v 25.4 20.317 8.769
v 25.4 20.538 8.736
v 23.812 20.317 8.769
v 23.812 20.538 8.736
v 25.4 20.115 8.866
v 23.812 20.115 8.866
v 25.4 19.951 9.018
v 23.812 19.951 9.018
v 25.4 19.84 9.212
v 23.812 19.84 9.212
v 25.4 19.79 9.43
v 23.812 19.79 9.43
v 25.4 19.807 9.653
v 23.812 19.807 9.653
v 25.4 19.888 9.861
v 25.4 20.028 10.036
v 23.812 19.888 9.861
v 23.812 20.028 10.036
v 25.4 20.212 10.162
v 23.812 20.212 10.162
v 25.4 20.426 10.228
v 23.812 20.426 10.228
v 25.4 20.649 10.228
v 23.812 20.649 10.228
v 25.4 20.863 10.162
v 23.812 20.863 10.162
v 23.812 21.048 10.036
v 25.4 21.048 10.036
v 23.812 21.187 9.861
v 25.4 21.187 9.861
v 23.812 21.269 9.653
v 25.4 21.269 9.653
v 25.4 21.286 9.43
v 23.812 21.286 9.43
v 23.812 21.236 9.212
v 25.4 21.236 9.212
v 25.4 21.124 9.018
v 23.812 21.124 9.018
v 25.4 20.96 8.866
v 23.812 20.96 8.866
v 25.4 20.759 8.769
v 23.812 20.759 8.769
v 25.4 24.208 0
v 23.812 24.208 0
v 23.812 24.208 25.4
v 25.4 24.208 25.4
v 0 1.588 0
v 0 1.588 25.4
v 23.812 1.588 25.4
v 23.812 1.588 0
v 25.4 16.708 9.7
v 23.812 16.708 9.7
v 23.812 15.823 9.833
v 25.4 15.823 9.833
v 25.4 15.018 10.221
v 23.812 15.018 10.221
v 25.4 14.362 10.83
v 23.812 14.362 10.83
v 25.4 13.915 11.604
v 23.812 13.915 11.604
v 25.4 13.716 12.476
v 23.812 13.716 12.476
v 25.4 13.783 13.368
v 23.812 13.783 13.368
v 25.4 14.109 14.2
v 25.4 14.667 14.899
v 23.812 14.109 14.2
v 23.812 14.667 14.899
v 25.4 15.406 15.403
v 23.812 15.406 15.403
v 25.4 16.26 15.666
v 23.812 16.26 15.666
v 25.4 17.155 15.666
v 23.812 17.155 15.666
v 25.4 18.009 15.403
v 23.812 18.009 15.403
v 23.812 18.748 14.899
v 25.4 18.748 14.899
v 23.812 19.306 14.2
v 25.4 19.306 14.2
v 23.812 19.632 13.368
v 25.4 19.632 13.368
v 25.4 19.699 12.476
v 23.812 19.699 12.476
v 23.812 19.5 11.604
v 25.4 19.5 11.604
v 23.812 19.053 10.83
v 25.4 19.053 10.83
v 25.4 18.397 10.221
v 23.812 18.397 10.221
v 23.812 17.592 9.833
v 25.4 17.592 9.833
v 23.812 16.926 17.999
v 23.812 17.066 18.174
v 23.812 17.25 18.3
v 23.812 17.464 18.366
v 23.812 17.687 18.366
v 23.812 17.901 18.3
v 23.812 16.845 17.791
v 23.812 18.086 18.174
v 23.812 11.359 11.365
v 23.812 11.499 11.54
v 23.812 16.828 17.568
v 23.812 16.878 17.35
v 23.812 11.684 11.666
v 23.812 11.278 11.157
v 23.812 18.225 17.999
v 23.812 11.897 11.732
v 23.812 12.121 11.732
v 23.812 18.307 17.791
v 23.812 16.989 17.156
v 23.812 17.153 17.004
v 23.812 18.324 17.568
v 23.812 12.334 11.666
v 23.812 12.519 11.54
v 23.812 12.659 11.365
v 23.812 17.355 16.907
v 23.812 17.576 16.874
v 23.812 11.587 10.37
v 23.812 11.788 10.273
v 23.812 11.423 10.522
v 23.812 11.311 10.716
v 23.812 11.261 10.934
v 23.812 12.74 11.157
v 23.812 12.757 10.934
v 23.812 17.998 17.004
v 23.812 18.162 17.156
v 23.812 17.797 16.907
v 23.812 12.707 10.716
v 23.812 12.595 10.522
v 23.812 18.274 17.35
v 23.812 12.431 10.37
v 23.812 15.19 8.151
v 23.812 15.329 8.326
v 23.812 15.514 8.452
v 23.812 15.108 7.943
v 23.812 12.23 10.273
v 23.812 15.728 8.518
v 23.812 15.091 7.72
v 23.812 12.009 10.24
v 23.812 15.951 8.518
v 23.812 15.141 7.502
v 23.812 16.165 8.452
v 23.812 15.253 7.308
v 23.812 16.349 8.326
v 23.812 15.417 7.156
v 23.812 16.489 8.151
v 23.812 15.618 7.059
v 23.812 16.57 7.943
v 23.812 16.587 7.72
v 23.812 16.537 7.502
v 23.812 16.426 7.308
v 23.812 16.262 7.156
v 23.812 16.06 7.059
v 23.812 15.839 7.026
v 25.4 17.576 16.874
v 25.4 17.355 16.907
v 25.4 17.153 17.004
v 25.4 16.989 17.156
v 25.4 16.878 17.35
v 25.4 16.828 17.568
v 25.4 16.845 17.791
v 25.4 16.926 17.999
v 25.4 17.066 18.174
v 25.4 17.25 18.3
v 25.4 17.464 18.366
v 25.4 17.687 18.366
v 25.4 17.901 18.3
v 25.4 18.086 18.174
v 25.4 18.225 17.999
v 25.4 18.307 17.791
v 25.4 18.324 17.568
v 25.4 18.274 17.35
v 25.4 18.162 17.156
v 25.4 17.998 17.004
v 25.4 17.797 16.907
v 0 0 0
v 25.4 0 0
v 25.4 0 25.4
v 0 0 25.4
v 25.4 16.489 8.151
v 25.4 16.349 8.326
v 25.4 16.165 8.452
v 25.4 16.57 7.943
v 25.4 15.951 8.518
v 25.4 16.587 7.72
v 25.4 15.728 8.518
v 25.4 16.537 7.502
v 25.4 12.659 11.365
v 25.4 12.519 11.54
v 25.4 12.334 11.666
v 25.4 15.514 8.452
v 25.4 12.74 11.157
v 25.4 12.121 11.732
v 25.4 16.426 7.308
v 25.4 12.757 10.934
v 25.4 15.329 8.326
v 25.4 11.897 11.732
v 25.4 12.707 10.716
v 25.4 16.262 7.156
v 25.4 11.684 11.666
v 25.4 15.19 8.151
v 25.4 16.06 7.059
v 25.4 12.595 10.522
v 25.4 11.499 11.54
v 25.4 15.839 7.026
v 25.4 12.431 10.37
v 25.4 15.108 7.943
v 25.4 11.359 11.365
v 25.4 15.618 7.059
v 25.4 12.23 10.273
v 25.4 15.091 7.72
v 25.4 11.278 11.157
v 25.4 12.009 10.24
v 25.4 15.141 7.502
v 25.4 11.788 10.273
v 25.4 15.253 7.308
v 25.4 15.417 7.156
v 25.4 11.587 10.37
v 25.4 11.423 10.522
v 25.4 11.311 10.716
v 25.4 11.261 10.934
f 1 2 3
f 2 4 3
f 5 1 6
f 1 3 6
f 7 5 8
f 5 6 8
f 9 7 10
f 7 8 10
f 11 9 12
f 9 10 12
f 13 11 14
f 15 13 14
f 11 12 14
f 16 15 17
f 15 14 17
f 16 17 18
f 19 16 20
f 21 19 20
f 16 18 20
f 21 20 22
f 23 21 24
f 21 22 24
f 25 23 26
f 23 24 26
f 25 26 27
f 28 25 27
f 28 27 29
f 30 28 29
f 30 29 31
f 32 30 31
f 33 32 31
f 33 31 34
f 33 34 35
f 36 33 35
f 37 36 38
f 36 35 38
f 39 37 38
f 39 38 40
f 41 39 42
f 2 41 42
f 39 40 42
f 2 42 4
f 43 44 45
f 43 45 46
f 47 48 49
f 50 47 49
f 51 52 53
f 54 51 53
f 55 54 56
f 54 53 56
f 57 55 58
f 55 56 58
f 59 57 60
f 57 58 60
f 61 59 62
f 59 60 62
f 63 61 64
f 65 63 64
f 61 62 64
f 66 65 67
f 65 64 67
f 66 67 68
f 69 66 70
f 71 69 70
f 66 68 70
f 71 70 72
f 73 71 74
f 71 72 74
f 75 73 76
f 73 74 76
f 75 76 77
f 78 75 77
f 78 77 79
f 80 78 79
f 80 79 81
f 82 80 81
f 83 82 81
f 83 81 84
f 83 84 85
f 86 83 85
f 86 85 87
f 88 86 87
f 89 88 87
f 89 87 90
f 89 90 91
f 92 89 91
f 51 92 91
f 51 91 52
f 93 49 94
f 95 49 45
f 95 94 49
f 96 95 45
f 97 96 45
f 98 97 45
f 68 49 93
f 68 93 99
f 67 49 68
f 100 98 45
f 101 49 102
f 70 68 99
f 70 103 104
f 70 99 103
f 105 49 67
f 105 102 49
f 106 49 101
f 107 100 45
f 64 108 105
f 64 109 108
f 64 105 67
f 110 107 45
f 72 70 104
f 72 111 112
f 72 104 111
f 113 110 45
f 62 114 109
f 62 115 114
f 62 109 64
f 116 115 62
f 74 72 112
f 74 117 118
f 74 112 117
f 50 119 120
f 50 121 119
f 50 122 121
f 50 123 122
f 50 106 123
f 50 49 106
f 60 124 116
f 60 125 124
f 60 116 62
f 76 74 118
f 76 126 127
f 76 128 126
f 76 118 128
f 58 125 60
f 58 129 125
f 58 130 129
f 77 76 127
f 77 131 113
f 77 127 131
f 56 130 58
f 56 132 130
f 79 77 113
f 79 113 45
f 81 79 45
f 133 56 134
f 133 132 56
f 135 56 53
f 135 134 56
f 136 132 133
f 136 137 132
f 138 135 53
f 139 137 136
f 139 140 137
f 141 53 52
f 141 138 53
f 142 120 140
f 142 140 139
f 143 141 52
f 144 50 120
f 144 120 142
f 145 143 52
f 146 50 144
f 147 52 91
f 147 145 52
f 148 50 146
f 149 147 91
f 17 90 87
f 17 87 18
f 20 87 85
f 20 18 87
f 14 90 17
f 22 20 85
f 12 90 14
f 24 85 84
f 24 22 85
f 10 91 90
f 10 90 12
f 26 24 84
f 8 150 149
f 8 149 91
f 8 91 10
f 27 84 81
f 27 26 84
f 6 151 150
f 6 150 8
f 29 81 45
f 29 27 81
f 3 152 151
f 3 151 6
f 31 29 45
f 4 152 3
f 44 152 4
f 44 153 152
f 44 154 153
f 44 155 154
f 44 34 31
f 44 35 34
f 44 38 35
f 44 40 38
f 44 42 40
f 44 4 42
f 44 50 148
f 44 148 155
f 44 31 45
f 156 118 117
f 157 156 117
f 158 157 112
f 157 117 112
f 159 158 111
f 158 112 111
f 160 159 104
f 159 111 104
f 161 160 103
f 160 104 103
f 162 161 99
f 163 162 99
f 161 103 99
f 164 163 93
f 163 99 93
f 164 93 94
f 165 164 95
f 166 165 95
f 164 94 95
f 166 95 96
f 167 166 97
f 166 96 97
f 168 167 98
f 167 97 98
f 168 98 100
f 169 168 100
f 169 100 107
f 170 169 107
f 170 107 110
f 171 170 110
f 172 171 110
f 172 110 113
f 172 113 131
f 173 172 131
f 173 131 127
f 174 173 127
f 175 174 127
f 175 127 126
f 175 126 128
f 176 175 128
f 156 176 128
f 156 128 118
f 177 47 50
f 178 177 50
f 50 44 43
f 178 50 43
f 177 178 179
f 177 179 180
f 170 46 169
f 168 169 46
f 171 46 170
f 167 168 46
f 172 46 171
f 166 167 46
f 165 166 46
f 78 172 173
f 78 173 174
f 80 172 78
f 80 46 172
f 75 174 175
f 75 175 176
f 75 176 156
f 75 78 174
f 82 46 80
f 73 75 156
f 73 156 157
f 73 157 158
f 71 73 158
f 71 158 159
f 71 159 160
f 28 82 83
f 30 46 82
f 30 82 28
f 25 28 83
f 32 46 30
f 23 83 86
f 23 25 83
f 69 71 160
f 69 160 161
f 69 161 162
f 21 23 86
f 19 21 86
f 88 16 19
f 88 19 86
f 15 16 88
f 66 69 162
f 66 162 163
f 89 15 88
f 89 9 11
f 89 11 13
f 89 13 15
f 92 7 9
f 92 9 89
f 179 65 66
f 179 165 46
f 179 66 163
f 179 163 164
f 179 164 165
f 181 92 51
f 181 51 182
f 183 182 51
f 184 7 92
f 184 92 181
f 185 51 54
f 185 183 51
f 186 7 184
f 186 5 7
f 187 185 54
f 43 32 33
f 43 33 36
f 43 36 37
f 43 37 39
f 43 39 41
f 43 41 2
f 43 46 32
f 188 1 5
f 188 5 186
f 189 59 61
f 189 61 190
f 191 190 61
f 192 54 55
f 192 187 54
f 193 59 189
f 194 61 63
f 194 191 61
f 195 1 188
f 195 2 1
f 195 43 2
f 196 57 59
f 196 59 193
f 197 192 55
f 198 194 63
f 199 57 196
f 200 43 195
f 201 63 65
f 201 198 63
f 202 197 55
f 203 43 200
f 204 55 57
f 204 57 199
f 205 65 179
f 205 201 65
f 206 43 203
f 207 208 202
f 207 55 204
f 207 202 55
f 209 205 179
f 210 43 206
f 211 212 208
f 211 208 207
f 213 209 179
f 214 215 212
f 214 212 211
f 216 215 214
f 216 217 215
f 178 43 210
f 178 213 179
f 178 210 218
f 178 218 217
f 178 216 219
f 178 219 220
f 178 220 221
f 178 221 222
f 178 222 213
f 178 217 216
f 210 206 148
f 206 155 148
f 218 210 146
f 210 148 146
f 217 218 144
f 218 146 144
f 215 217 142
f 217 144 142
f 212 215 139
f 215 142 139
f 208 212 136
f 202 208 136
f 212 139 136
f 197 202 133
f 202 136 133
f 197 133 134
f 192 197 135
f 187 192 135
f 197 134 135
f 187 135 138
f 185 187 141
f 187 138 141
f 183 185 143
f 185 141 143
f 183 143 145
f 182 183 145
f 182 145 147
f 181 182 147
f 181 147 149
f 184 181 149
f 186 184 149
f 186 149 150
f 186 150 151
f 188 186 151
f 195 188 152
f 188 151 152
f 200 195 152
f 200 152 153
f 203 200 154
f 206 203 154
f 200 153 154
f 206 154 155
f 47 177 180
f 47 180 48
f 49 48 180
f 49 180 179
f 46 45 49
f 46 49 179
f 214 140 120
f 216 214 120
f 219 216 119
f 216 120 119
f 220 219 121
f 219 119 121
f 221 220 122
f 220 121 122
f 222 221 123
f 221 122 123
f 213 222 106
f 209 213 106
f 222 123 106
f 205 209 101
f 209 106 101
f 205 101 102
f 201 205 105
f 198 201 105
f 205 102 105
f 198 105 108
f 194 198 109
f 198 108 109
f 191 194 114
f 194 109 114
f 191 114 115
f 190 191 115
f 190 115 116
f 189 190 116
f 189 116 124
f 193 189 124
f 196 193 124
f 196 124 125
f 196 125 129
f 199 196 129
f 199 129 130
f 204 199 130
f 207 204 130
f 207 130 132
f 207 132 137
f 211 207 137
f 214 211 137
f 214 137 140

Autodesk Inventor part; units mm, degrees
ref_plane "YZ Plane" through (0, 0, 0) normal (1, 0, 0) x (0, 1, 0)
ref_plane "XZ Plane" through (0, 0, 0) normal (0, 1, 0) x (-1, 0, 0)
ref_plane "XY Plane" through (0, 0, 0) normal (0, 0, 1) x (1, 0, 0)
sketch "Sketch1" plane through (0, 0, 0) normal (0, 0, 1) x (1, 0, 0)
  line L0 (0, 0) -> (0, 1.5875)
  line L1 (0, 1.5875) -> (23.8125, 1.5875)
  line L2 (23.8125, 1.5875) -> (23.8125, 24.2075)
  line L3 (23.8125, 24.2075) -> (25.4, 24.2075)
  line L4 (25.4, 24.2075) -> (25.4, 0)
  line L5 (25.4, 0) -> (0, 0)
  dimension "d0" = 1.5875
  dimension "d3" = 90
  dimension "d9" = 25.4
  dimension "d10" = 22.62
extrude "Extrusion1" add sketch "Sketch1" along normal blind 25.4
sketch "Sketch2" plane through (25.4, 0, 0) normal (1, 0, 0) x (0, 0, -1)
  circle A0 centre (-12.7, 16.7075) radius 7.5
  line L0 (0, 24.2075) -> (-25.4, 24.2075) projected
  circle A1 centre (-12.7, 16.7075) radius 5
  line L1 (-12.7, 16.7075) -> (-9.4861, 20.5377)
  line L2 (-12.7, 16.7075) -> (-7.776, 15.8393)
  line L3 (-12.7, 16.7075) -> (-10.9899, 12.009)
  line L4 (-12.7, 16.7075) -> (-17.624, 17.5757)
  line L5 (-25.4, 0) -> (-25.4, 24.2075) projected
  point P0 (0, 0)
  dimension "d6" = 12.7
  dimension "d7" = 7.5
  dimension "d8" = 15
  dimension "d11" = 10
  dimension "d12" = 40
  dimension "d13" = 60
  dimension "d14" = 60
  dimension "d15" = 120
hole "Hole1" at (25.4, 17.5757, 17.624) at (25.4, 20.5377, 9.4861) at (25.4, 15.8393, 7.776) at (25.4, 12.009, 10.9899) direction (-1, 0, 0) diameter 1.5 end through all
sketch "Sketch3" plane through (25.4, 0, 0) normal (1, 0, 0) x (0, 0, -1)
  circle A0 centre (-12.7, 16.7075) radius 7.5
  line L0 (0, 24.2075) -> (-25.4, 24.2075) projected
  line L1 (0, 24.2075) -> (0, 0) projected
  dimension "d23" = 15
  dimension "d24" = 7.5
  dimension "d25" = 12.7
hole "Hole2" at (25.4, 16.7075, 12.7) direction (-1, 0, 0) diameter 6 end through all
properties part number "MotorMount" material "Aluminum 6061"
